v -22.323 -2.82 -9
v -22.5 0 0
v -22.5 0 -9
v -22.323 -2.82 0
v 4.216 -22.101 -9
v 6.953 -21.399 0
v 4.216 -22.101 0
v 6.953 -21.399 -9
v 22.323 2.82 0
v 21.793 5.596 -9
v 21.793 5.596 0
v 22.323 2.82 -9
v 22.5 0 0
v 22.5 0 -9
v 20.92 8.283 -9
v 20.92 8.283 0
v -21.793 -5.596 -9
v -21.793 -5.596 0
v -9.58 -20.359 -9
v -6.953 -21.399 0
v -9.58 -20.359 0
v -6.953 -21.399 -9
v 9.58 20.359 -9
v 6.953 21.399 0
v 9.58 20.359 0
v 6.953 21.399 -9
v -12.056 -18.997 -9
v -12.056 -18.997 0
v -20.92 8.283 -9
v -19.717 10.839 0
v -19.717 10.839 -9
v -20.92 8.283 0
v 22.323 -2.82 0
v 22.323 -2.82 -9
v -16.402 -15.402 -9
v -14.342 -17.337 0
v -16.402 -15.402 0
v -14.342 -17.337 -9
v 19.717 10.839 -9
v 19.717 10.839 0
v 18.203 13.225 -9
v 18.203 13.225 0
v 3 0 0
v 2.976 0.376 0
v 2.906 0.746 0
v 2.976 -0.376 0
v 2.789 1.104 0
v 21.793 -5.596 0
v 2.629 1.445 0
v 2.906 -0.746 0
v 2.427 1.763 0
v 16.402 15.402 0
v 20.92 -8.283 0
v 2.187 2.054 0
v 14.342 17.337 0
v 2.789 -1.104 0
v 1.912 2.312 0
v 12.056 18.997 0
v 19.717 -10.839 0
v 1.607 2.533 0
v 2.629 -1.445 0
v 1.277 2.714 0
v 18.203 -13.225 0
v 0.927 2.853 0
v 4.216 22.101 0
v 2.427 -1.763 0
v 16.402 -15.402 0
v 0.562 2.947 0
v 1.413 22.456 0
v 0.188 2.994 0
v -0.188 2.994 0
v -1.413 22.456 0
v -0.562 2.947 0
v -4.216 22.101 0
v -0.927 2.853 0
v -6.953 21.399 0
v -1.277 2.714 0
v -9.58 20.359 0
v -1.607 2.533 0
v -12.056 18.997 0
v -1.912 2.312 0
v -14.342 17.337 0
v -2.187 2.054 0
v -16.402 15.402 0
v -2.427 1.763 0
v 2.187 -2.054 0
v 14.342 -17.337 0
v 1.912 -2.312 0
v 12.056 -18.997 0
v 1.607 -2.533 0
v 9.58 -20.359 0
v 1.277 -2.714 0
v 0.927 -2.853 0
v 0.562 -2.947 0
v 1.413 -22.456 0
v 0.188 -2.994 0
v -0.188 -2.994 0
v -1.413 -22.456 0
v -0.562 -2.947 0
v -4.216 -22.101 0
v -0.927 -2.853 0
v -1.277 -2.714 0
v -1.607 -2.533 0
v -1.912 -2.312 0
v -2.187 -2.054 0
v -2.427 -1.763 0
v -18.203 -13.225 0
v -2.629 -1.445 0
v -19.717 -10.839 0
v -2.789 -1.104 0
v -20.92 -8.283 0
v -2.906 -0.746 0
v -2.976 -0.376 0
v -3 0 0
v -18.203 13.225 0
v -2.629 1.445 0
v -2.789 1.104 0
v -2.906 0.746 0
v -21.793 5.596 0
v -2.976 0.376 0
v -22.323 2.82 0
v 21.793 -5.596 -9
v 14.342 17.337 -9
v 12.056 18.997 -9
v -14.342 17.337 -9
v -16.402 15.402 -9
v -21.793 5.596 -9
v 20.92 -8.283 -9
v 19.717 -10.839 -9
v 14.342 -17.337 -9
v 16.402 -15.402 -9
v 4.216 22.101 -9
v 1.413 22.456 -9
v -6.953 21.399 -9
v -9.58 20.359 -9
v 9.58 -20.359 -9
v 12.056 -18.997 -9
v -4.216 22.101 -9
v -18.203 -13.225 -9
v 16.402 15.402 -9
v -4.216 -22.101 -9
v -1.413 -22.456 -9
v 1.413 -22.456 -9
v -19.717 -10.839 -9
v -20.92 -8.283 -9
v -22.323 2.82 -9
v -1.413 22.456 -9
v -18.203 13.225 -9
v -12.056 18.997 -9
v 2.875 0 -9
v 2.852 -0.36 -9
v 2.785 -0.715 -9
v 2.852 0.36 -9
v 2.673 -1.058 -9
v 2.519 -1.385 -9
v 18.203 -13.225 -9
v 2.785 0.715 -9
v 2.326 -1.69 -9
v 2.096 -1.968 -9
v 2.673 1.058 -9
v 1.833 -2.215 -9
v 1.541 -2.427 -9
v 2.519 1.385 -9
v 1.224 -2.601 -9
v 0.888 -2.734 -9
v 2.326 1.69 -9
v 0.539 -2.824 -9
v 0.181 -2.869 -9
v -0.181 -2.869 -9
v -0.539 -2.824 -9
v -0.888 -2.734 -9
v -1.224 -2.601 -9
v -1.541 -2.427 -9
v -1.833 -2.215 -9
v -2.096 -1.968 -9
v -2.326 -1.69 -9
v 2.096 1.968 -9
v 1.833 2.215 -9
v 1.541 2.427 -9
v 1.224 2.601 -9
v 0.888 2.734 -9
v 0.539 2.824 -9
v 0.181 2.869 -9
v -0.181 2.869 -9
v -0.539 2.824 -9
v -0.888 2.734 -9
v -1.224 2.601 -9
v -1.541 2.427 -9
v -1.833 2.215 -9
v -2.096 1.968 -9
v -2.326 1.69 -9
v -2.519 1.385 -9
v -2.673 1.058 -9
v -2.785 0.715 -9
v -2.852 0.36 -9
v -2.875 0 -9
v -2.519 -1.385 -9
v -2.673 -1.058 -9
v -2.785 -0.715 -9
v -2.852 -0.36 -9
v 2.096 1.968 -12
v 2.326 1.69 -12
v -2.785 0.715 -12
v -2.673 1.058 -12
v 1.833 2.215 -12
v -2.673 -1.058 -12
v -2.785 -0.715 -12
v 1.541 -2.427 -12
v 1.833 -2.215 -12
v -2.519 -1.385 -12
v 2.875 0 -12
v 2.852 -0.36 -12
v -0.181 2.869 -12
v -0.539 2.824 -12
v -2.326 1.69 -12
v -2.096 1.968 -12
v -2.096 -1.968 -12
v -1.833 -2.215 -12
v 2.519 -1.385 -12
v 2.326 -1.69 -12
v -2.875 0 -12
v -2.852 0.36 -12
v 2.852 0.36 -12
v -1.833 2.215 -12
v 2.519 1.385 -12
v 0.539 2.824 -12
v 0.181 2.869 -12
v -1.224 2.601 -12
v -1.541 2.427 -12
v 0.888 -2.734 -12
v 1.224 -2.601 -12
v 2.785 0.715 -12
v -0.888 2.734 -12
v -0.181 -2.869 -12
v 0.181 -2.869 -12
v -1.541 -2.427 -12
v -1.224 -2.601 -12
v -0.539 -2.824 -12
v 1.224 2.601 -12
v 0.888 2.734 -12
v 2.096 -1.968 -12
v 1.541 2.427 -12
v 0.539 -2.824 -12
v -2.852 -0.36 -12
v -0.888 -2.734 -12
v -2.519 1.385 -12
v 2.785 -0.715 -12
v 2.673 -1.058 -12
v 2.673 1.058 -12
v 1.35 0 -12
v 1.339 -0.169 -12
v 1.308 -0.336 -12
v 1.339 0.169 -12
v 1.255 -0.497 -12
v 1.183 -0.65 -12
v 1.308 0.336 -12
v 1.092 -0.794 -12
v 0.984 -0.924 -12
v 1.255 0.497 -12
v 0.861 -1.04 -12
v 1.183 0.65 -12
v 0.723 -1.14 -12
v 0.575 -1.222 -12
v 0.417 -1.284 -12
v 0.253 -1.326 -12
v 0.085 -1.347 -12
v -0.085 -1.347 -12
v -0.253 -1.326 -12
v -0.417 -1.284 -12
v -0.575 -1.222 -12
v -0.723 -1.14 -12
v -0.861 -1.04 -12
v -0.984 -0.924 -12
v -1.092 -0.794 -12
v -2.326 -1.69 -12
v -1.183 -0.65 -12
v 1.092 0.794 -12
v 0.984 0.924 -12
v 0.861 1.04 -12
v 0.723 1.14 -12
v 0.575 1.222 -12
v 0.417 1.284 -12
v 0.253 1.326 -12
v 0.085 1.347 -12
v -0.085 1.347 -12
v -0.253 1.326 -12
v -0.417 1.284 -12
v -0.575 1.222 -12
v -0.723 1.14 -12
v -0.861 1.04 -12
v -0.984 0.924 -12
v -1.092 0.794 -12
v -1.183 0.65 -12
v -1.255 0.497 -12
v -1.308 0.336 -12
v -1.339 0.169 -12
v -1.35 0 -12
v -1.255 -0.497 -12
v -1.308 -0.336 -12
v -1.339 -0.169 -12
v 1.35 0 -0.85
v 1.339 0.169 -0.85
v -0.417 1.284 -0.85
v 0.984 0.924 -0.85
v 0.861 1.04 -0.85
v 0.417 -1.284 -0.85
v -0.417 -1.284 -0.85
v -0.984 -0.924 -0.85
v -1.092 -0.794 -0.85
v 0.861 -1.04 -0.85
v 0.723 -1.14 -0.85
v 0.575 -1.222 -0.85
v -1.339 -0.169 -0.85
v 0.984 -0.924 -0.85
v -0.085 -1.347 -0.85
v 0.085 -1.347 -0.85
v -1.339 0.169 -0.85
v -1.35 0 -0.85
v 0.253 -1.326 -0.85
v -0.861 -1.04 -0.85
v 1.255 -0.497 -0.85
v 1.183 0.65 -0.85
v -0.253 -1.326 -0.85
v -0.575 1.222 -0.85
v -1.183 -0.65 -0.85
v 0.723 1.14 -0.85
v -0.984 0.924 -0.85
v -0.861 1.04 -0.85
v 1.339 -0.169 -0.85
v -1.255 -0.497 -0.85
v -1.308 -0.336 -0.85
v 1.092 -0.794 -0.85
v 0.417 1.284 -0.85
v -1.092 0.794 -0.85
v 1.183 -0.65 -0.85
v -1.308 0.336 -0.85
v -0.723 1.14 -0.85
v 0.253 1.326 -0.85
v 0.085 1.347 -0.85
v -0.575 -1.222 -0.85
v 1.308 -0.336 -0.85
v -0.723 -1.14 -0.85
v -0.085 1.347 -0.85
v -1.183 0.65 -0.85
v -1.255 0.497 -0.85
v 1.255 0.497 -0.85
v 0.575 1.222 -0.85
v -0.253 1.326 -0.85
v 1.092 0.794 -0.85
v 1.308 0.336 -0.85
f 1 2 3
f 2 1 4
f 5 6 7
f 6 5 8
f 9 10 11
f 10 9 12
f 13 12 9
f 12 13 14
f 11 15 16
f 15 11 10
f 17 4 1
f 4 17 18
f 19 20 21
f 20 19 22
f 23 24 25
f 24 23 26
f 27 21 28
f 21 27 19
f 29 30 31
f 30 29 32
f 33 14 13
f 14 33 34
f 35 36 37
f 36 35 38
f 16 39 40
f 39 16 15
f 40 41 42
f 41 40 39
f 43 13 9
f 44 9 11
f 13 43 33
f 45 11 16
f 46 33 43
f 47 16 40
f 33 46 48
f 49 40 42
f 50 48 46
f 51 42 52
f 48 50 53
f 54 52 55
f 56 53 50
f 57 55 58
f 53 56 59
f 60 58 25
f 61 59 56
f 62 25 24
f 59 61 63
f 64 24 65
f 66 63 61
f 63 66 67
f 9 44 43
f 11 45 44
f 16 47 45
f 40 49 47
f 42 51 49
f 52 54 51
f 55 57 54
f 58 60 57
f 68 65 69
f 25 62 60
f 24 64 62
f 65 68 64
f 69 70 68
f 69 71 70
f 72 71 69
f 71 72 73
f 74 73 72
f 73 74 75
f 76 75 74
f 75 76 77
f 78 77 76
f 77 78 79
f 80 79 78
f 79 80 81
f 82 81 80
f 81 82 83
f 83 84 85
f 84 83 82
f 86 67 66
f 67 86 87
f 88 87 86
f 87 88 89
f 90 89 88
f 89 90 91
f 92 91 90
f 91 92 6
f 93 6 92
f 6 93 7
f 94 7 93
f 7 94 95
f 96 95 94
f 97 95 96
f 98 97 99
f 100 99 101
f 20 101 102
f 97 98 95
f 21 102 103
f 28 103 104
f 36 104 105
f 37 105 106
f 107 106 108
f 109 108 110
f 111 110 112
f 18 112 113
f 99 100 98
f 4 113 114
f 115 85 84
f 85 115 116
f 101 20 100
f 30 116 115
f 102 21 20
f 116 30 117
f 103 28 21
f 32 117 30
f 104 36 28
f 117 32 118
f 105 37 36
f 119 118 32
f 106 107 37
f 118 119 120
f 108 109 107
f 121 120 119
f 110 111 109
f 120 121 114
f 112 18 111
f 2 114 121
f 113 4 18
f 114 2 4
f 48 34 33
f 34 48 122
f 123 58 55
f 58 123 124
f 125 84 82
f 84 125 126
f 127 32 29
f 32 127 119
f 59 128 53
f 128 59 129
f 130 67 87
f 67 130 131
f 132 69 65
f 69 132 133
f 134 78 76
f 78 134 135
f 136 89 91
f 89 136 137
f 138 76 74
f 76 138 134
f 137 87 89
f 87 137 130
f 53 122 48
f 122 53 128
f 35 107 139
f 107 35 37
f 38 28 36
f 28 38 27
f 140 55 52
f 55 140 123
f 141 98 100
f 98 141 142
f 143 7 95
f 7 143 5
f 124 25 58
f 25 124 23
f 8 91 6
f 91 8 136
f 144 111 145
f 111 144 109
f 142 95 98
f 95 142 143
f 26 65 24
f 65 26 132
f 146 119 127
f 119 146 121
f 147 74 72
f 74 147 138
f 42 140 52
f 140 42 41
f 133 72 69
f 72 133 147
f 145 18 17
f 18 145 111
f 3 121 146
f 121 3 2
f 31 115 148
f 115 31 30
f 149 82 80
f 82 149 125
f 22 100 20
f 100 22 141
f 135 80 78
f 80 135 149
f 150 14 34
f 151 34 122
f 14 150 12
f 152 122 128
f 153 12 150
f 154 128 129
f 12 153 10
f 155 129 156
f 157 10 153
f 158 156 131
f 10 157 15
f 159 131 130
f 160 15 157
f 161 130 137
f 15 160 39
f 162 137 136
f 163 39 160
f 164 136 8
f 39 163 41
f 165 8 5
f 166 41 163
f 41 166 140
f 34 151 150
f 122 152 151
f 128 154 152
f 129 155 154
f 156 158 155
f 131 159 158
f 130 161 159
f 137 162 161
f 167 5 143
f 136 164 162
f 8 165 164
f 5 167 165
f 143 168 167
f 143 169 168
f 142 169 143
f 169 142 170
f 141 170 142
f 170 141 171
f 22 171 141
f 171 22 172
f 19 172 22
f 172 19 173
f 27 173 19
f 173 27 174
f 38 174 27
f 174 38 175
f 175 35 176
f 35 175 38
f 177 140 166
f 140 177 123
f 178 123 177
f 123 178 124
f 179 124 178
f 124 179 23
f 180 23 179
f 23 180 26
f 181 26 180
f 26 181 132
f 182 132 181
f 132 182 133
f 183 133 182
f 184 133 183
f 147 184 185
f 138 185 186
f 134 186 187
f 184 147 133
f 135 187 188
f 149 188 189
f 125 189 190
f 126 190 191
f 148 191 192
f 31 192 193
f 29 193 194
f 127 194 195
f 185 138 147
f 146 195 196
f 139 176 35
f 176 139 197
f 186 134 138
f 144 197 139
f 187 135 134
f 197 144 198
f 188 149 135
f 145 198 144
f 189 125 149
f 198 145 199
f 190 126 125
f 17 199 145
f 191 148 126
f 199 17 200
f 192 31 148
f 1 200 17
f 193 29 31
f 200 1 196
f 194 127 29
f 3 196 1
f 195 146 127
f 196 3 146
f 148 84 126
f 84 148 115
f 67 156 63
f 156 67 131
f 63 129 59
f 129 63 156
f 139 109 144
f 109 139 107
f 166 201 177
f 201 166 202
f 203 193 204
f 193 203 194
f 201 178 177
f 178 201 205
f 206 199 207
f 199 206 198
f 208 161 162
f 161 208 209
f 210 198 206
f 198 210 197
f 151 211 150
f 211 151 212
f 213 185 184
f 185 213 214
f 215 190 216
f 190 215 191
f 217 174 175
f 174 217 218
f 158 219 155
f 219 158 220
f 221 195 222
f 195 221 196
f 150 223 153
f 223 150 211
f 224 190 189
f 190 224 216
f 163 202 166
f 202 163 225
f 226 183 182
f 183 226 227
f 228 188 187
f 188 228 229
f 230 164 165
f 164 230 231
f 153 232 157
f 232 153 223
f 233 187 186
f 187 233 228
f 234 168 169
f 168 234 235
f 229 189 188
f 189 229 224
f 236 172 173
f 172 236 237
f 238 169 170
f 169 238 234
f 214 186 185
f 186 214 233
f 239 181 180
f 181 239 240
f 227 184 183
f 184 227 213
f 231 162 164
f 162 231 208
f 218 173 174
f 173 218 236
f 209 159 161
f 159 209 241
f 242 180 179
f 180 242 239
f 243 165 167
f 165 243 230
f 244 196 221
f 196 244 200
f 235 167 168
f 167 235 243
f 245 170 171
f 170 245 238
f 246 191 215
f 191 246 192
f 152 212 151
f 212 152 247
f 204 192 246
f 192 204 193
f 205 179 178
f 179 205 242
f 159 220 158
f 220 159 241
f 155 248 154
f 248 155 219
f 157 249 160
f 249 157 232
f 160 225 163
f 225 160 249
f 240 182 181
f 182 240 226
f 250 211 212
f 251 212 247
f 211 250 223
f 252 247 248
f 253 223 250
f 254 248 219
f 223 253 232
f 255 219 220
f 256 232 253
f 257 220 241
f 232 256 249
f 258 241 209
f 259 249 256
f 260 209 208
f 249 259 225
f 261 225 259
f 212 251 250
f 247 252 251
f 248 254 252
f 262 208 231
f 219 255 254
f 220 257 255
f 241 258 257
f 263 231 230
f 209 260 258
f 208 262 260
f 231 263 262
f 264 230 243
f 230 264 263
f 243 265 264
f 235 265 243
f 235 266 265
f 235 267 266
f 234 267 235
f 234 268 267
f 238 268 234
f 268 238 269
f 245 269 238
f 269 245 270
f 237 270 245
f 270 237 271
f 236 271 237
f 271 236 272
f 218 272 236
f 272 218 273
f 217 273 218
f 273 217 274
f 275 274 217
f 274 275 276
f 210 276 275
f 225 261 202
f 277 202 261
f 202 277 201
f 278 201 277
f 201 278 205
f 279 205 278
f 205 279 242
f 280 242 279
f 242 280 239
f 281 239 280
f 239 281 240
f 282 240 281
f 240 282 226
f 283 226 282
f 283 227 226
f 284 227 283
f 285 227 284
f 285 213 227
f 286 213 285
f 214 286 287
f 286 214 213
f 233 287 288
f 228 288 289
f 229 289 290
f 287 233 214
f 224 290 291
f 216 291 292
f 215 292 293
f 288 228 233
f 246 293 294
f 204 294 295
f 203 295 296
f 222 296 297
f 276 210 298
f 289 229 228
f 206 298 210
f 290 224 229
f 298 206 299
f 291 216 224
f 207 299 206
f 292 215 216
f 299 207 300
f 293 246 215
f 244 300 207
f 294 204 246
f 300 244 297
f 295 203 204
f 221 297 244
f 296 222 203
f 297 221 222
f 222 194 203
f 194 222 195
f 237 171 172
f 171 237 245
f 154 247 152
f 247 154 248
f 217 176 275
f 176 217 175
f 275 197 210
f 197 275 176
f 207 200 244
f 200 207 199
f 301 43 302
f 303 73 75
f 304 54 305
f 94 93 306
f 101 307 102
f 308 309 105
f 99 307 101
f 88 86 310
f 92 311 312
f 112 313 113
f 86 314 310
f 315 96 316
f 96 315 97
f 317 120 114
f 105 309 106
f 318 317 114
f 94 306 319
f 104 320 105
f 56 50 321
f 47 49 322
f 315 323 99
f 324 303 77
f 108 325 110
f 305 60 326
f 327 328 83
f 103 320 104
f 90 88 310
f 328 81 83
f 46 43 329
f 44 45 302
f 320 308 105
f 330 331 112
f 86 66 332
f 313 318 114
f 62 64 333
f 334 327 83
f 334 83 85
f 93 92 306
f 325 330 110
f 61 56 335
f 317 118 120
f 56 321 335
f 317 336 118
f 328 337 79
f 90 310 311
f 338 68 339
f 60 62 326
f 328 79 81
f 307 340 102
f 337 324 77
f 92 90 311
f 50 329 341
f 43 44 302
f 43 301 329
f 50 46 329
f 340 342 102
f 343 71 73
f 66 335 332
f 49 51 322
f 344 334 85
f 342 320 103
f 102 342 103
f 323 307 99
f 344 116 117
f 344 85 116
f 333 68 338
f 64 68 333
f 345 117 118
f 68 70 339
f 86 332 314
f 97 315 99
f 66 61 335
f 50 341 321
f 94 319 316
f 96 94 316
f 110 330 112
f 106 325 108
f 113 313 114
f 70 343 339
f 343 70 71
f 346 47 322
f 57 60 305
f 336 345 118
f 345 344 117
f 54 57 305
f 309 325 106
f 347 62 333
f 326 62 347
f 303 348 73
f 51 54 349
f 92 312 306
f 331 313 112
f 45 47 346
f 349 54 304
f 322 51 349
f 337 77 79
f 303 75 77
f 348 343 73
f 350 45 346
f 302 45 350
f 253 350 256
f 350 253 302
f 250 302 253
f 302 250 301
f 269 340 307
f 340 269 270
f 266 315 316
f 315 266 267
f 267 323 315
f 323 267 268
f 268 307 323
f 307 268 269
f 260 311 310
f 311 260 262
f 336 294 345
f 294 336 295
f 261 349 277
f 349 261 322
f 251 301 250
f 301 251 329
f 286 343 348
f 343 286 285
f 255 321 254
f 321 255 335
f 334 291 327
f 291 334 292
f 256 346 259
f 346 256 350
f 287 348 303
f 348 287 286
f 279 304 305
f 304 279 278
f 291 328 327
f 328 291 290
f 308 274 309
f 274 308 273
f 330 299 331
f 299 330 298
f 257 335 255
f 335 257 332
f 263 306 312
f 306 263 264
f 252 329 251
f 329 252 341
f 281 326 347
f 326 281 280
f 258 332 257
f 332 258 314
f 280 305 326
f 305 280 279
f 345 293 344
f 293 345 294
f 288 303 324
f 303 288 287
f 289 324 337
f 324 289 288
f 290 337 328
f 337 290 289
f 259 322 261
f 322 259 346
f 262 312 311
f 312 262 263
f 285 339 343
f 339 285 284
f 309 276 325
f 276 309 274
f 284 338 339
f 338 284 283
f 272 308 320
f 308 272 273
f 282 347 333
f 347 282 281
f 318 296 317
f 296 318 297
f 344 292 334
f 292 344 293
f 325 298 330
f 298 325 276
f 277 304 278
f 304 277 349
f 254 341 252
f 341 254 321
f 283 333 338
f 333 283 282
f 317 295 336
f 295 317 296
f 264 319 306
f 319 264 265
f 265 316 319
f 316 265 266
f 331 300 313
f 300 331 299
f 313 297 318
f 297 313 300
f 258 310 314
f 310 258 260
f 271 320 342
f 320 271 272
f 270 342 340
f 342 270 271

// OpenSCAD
$fn = 50;

difference() {
	union() {
		translate(v = [0, 0, -9.0]) {
			cylinder(h = 9, r = 22.5);
		}
		#translate(v = [0, 0, -12.0]) {
			cylinder(h = 12, r = 2.875);
		}
	}
	union() {
		translate(v = [0, 0, 0]) {
			rotate(a = [0, 0, 0]) {
				difference() {
					union() {
						translate(v = [0, 0, -12.0]) {
							cylinder(h = 12, r = 1.0);
						}
						translate(v = [0, 0, -0.85]) {
							cylinder(h = 0.85, r1 = 1.35, r2 = 3.0);
						}
						translate(v = [0, 0, -12.0]) {
							cylinder(h = 12, r = 1.35);
						}
						translate(v = [0, 0, -12.0]) {
							cylinder(h = 12, r = 1.0);
						}
					}
					union();
				}
			}
		}
	}
}
